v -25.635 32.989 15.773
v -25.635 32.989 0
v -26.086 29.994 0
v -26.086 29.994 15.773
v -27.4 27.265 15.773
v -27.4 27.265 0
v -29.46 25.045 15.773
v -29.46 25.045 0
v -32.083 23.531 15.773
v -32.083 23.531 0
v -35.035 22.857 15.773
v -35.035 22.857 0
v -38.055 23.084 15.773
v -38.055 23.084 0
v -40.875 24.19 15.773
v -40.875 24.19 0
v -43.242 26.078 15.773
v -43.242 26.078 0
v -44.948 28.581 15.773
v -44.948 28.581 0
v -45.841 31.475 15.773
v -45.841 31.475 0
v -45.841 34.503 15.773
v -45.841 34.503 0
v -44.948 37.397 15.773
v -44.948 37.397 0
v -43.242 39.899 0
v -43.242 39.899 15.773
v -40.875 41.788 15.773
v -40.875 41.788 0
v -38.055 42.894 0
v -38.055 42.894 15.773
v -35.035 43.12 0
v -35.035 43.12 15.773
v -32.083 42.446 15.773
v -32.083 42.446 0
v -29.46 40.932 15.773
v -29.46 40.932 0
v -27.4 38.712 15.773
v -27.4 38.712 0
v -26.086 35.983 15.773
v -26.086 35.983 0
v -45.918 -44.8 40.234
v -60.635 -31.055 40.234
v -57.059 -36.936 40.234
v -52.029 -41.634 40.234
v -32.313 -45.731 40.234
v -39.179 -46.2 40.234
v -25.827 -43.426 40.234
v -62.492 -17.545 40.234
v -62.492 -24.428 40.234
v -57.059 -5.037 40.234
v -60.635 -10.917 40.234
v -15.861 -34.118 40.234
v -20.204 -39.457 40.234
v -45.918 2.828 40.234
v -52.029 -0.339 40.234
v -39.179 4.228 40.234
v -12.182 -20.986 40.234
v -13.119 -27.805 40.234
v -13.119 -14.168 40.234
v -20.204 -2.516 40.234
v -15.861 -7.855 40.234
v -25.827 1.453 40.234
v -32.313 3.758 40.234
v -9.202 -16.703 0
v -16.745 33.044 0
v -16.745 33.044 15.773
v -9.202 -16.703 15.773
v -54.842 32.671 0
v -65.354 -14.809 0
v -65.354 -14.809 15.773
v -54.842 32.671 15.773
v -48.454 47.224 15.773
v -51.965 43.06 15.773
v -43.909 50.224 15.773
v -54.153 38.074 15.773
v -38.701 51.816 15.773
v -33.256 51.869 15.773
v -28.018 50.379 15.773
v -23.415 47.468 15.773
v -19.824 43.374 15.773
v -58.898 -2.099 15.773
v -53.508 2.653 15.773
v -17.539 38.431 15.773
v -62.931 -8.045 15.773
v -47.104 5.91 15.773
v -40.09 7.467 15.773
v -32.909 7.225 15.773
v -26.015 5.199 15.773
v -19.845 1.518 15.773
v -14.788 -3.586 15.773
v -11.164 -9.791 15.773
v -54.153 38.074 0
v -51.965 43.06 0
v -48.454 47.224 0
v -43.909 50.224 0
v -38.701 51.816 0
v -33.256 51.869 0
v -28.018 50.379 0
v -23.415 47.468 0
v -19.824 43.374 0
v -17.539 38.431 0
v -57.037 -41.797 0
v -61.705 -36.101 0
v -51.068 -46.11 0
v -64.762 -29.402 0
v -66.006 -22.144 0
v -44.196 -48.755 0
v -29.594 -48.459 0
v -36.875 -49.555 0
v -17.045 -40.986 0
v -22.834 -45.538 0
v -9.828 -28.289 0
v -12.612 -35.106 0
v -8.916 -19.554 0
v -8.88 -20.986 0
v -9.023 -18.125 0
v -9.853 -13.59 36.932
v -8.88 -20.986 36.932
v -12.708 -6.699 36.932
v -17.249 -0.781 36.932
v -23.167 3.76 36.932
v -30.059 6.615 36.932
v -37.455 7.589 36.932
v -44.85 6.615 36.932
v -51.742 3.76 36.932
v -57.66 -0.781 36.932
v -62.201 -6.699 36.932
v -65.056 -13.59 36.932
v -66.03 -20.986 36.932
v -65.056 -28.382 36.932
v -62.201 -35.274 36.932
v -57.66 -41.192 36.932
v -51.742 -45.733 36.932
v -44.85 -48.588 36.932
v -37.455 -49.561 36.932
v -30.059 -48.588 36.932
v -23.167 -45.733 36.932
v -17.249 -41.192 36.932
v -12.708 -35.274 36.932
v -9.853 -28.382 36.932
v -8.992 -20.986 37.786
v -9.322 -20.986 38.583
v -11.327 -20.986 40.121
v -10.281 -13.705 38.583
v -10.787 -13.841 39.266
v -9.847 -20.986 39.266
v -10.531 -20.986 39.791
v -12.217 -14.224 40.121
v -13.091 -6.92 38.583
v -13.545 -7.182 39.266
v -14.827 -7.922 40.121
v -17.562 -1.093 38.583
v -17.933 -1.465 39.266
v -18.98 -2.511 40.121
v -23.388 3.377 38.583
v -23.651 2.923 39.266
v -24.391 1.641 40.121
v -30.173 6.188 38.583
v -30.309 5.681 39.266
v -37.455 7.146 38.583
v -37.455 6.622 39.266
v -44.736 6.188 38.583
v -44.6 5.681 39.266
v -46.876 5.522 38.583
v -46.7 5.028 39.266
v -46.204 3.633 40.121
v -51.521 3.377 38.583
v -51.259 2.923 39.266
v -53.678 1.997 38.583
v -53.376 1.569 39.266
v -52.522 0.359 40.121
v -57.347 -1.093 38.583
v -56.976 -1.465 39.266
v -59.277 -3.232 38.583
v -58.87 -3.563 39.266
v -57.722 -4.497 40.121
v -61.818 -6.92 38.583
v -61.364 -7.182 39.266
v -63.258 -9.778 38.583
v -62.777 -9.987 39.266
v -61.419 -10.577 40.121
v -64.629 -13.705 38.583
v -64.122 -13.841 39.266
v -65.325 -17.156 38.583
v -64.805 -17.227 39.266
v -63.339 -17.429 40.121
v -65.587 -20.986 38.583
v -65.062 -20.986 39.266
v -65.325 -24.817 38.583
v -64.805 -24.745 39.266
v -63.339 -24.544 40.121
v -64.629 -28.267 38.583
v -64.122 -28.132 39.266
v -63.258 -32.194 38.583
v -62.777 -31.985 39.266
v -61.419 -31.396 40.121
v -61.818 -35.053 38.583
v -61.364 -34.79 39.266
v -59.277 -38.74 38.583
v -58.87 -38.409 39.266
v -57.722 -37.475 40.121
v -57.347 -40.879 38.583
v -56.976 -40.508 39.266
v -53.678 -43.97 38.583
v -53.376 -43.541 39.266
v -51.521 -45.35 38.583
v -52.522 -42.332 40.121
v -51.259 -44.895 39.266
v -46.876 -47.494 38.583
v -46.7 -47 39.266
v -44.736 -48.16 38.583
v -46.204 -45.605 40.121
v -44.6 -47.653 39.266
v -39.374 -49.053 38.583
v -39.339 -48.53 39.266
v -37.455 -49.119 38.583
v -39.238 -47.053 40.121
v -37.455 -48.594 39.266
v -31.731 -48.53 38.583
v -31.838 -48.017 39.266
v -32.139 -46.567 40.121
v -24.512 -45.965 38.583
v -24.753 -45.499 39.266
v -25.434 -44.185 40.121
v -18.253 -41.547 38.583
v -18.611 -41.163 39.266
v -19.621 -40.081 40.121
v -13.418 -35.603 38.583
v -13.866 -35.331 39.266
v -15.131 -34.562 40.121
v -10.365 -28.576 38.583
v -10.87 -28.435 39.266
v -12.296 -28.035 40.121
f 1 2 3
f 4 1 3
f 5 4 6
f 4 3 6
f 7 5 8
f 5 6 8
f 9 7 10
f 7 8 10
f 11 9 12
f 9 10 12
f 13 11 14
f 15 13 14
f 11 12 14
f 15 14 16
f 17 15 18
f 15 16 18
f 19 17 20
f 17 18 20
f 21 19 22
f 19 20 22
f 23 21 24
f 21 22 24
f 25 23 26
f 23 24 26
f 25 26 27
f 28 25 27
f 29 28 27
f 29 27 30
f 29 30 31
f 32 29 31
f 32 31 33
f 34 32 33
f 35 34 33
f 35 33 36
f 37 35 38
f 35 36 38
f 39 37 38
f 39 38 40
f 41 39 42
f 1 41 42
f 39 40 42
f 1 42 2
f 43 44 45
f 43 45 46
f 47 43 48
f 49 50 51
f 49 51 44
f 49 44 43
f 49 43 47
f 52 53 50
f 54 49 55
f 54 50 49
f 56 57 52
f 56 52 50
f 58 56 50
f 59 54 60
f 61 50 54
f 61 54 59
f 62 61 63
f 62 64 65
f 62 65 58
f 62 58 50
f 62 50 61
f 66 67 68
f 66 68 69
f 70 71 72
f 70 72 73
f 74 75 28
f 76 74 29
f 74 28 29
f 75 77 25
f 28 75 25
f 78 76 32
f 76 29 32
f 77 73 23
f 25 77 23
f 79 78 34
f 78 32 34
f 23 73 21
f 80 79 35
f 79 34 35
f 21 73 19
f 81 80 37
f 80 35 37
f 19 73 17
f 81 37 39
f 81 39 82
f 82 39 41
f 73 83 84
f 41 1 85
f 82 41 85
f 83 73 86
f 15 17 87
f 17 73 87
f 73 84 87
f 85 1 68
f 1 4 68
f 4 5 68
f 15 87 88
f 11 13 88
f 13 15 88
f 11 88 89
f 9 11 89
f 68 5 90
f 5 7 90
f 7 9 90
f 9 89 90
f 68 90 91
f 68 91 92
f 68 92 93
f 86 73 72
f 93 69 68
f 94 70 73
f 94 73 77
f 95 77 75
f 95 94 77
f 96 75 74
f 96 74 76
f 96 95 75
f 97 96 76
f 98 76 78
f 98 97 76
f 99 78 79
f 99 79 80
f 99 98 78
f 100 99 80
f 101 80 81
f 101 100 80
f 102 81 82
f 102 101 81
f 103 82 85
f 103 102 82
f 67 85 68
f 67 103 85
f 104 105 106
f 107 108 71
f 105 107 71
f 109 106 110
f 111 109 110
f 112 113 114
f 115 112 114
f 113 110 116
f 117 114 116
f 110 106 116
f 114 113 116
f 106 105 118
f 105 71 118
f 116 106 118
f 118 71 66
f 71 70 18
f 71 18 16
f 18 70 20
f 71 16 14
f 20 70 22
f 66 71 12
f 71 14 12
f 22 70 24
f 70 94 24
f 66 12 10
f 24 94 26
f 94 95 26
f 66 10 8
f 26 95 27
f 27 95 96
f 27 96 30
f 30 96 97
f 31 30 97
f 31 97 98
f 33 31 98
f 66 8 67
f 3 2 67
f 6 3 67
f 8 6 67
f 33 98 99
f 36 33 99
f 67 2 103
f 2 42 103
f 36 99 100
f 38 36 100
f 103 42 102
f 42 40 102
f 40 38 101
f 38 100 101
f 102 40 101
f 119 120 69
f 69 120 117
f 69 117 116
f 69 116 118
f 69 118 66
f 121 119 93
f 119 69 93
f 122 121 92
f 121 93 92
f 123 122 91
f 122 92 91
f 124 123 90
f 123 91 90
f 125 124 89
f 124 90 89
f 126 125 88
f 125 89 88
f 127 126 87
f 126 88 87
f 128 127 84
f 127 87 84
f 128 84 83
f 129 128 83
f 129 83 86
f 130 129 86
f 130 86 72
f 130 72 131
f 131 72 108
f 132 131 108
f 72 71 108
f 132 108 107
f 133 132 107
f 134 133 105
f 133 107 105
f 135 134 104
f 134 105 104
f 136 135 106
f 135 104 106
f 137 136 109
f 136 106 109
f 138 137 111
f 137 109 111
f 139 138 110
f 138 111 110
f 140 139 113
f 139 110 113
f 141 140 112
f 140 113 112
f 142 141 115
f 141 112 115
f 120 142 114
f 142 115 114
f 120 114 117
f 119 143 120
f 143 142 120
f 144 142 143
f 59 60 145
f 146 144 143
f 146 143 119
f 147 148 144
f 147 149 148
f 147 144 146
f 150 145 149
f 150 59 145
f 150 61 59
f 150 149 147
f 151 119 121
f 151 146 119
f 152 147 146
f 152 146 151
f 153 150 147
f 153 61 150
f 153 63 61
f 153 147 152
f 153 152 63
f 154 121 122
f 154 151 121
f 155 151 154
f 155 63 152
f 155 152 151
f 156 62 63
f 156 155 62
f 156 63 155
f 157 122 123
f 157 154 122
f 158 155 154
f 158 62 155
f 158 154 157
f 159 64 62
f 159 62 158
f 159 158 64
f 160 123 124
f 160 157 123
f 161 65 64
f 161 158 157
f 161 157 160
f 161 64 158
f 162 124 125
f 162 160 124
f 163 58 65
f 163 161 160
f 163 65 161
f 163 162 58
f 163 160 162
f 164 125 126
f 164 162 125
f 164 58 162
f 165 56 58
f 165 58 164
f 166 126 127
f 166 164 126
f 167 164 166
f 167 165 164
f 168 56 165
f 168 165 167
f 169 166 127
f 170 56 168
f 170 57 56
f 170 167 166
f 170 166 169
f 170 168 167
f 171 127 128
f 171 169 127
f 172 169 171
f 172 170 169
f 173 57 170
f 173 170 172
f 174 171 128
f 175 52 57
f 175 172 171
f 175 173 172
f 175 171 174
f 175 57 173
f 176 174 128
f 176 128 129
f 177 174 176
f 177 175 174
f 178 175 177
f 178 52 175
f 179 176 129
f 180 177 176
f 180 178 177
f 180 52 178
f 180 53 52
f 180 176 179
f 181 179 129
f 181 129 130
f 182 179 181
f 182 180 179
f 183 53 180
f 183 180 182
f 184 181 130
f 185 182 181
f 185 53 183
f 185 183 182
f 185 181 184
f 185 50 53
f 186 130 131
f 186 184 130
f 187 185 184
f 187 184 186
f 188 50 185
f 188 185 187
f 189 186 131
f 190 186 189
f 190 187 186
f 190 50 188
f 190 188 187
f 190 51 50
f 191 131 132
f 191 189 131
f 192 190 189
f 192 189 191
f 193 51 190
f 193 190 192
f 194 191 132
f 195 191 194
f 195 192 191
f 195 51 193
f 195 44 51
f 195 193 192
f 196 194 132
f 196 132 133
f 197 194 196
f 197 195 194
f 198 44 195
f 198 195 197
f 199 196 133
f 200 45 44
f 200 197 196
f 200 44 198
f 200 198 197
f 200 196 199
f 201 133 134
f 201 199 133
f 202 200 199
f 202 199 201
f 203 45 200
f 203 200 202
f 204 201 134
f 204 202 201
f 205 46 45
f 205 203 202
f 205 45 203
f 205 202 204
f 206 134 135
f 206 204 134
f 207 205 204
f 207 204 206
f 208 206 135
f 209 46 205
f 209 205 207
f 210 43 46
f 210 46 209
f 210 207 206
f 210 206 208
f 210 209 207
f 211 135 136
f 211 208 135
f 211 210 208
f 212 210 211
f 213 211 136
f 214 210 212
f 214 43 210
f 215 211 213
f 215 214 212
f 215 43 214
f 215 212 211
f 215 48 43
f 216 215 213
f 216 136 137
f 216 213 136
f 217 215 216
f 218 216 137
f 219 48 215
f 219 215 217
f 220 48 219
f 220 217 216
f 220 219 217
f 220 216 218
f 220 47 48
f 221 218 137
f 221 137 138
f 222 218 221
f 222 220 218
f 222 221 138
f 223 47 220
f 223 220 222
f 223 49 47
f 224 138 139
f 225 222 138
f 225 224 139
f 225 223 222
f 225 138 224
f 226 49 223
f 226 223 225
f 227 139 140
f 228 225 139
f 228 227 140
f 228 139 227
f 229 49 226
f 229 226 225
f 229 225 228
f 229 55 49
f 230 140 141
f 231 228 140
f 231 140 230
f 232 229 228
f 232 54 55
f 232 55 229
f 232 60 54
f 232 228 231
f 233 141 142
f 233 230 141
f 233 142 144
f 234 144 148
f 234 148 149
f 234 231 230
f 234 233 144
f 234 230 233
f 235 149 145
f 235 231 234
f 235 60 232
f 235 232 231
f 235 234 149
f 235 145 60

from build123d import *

# Parameters (mm, degrees)
F0_R     = 28.575
F1_DEPTH = 40.2336
F2_R     = 3.302
F4_R     = 10.16
F5_DEPTH = 15.7734


with BuildPart() as f1:
    # F0 (on Top) → F1 (new body)
    with BuildSketch(Plane.XY):
        with Locations((-37.4545902014, -20.9862291813)):
            Circle(F0_R)
    extrude(amount=F1_DEPTH)

    # F2
    f2_edges = [f1.edges().sort_by_distance(p)[0] for p in [
        (-66.02959, -20.986229, 40.2336),
    ]]
    fillet(f2_edges, radius=F2_R)

    # F4 (on face) → F5 (join)
    with BuildSketch(Plane(origin=(0, 0, 0), x_dir=(1, 0, 0), z_dir=(0, 0, -1))):
        with BuildLine():
            Line((-65.3540068038, 14.8094032778), (-54.8419142609, -32.6714961972))
            ThreePointArc((-54.8419142609, -32.6714961972), (-35.9806114834, -52.0378622288), (-16.7446354188, -33.0435972896))
            Line((-16.7446354188, -33.0435972896), (-9.202451986, 16.7028530294))
            ThreePointArc((-9.202451986, 16.7028530294), (-36.4915787142, -7.5725388922), (-65.3540068038, 14.8094032778))
        make_face()
        with Locations((-35.7945565225, -32.9887708187)):
            Circle(F4_R, mode=Mode.SUBTRACT)
    extrude(amount=-F5_DEPTH)


solid = f1.part
